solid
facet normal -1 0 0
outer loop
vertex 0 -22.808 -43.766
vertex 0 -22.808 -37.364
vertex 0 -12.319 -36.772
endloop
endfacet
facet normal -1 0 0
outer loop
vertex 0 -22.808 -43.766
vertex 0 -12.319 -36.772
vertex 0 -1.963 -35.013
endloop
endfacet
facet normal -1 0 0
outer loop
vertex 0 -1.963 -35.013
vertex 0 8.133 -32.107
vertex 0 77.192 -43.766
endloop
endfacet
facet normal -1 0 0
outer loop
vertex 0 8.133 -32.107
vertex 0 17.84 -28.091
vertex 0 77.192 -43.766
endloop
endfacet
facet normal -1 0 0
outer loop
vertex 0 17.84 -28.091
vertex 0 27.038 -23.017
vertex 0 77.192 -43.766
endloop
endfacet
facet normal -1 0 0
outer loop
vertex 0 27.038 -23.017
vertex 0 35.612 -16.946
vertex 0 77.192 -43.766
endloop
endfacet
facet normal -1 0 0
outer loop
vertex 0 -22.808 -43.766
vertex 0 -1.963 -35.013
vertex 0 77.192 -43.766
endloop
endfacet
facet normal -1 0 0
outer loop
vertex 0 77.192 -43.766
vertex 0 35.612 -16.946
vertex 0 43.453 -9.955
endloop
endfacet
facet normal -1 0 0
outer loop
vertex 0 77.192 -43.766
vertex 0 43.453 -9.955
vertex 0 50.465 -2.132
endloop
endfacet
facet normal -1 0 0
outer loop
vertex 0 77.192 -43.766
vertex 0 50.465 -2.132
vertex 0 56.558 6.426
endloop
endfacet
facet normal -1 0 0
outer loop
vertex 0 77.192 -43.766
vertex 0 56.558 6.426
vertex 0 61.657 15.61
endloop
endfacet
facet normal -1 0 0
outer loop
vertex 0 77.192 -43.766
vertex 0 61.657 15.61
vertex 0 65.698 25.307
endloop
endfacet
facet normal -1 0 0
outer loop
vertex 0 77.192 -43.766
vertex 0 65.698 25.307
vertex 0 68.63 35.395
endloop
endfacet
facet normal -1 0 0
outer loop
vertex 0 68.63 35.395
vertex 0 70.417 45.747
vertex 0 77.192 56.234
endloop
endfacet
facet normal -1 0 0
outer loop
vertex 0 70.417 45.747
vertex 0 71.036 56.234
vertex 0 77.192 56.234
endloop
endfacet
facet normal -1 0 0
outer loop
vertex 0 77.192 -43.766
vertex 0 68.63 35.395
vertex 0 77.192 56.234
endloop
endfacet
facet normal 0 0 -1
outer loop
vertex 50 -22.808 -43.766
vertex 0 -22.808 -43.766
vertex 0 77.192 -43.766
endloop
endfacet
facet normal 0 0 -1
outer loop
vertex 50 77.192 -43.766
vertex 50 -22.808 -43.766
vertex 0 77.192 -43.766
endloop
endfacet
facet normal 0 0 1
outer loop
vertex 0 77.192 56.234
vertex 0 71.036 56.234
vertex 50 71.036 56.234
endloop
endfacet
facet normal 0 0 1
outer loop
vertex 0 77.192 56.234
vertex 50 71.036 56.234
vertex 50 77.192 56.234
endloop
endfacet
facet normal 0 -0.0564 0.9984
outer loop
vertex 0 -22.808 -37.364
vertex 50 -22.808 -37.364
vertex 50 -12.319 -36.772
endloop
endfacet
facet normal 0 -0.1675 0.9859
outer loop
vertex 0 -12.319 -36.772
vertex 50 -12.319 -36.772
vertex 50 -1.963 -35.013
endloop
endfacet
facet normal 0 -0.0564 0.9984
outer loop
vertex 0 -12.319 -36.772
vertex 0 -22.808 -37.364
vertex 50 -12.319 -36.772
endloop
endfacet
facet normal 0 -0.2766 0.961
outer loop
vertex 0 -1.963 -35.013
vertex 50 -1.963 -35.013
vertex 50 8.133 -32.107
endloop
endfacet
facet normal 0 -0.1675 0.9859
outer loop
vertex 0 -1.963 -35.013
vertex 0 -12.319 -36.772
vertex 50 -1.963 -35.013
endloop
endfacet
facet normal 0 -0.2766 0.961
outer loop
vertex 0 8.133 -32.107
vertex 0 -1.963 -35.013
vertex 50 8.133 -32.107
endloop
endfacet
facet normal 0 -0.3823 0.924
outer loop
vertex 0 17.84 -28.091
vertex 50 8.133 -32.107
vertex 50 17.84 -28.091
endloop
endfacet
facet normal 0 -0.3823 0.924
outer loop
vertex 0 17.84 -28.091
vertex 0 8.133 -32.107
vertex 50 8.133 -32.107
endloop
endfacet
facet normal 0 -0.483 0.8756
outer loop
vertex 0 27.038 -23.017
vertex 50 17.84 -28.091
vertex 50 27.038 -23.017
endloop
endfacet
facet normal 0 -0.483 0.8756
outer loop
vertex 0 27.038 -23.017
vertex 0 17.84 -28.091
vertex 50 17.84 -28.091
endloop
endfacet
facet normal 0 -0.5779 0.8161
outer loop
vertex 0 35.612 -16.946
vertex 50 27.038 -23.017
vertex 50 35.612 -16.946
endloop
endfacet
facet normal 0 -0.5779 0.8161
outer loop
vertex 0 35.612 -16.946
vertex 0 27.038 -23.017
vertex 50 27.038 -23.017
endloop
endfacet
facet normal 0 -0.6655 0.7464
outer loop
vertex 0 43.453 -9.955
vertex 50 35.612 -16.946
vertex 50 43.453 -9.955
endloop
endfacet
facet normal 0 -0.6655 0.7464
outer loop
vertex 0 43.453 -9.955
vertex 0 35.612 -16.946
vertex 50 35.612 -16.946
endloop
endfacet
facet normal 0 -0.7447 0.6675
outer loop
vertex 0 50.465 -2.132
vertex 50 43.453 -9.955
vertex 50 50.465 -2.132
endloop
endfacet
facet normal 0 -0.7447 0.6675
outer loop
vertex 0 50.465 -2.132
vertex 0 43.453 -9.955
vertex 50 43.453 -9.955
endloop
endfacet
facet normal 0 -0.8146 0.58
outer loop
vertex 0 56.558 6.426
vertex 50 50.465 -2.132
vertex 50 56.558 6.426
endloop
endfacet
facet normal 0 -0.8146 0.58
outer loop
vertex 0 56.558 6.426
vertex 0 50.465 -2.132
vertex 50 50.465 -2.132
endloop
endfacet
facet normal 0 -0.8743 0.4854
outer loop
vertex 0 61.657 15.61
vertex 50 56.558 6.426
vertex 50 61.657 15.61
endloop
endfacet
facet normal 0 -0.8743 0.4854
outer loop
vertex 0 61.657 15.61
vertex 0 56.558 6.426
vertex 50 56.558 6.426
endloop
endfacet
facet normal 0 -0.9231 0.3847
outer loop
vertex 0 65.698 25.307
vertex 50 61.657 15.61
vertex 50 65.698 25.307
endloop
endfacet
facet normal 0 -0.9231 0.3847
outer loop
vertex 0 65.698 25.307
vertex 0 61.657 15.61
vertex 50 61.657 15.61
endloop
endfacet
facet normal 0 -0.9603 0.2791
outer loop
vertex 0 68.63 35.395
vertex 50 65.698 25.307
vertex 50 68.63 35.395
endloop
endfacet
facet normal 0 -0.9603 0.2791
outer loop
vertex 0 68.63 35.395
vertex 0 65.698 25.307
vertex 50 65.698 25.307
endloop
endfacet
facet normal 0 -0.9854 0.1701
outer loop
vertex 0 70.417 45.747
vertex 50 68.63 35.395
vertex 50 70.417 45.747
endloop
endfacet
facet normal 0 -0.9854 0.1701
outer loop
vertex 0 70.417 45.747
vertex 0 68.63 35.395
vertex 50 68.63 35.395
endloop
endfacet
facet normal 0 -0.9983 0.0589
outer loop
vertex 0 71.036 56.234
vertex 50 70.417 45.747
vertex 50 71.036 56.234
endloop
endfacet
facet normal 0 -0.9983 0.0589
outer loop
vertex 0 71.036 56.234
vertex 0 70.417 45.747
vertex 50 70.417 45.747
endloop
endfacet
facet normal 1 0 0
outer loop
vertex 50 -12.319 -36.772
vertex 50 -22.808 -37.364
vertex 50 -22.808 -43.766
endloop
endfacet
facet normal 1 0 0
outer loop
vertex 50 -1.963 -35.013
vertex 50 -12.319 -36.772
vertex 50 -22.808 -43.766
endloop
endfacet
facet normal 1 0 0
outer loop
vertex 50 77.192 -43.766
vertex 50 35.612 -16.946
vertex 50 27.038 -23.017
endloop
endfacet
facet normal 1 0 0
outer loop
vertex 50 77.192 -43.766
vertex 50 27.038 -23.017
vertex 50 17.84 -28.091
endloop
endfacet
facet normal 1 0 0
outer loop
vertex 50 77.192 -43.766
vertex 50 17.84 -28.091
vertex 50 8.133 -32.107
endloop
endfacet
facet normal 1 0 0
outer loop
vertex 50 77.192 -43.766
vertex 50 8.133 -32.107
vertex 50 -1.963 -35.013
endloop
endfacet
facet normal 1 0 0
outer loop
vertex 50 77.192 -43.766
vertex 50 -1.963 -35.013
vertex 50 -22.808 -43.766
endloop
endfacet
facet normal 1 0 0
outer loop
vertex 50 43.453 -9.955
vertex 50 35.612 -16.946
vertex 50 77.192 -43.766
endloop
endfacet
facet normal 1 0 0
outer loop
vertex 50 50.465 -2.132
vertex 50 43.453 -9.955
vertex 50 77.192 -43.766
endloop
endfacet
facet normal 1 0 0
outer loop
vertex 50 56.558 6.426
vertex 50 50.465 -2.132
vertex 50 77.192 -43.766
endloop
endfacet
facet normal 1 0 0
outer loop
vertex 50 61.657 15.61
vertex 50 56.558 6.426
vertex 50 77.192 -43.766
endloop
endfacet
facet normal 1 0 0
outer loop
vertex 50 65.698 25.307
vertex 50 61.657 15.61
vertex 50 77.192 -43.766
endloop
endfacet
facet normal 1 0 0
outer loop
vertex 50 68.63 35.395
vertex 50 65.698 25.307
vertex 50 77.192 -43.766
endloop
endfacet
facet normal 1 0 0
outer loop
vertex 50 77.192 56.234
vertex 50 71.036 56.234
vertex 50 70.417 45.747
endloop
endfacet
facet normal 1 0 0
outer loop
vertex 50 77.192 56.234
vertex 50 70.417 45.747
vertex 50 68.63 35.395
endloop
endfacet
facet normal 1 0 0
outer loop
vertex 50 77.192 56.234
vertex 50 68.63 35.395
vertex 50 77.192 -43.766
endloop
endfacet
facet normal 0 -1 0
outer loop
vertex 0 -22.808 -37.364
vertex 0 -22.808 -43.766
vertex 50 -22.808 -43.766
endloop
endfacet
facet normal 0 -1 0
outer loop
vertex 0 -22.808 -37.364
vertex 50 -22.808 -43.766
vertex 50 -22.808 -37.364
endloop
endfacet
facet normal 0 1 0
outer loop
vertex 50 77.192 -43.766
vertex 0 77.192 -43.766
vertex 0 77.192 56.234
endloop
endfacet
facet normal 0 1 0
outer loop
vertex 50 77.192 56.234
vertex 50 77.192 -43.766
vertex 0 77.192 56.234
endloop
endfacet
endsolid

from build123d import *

# Parameters (mm, degrees)
F0_W     = 100
F0_H     = 100
F1_DEPTH = 50
F2_R     = 93.876824
F3_DEPTH = 75


with BuildPart() as f1:
    # F0 (on Right) → F1 (new body)
    with BuildSketch(Plane.YZ):
        with Locations((27.192001, 6.234261)):
            Rectangle(F0_W, F0_H)
    extrude(amount=F1_DEPTH)


with BuildPart() as f3:
    # F2 (on Right) → F3 (new body)
    with BuildSketch(Plane.YZ):
        with Locations((-22.840602, 56.513045)):
            Circle(F2_R)
    extrude(amount=F3_DEPTH)


with BuildPart() as f1_1:
    add(f1.part)

    # F4: cut F3
    add(f3.part, mode=Mode.SUBTRACT)


solid = f1_1.part
